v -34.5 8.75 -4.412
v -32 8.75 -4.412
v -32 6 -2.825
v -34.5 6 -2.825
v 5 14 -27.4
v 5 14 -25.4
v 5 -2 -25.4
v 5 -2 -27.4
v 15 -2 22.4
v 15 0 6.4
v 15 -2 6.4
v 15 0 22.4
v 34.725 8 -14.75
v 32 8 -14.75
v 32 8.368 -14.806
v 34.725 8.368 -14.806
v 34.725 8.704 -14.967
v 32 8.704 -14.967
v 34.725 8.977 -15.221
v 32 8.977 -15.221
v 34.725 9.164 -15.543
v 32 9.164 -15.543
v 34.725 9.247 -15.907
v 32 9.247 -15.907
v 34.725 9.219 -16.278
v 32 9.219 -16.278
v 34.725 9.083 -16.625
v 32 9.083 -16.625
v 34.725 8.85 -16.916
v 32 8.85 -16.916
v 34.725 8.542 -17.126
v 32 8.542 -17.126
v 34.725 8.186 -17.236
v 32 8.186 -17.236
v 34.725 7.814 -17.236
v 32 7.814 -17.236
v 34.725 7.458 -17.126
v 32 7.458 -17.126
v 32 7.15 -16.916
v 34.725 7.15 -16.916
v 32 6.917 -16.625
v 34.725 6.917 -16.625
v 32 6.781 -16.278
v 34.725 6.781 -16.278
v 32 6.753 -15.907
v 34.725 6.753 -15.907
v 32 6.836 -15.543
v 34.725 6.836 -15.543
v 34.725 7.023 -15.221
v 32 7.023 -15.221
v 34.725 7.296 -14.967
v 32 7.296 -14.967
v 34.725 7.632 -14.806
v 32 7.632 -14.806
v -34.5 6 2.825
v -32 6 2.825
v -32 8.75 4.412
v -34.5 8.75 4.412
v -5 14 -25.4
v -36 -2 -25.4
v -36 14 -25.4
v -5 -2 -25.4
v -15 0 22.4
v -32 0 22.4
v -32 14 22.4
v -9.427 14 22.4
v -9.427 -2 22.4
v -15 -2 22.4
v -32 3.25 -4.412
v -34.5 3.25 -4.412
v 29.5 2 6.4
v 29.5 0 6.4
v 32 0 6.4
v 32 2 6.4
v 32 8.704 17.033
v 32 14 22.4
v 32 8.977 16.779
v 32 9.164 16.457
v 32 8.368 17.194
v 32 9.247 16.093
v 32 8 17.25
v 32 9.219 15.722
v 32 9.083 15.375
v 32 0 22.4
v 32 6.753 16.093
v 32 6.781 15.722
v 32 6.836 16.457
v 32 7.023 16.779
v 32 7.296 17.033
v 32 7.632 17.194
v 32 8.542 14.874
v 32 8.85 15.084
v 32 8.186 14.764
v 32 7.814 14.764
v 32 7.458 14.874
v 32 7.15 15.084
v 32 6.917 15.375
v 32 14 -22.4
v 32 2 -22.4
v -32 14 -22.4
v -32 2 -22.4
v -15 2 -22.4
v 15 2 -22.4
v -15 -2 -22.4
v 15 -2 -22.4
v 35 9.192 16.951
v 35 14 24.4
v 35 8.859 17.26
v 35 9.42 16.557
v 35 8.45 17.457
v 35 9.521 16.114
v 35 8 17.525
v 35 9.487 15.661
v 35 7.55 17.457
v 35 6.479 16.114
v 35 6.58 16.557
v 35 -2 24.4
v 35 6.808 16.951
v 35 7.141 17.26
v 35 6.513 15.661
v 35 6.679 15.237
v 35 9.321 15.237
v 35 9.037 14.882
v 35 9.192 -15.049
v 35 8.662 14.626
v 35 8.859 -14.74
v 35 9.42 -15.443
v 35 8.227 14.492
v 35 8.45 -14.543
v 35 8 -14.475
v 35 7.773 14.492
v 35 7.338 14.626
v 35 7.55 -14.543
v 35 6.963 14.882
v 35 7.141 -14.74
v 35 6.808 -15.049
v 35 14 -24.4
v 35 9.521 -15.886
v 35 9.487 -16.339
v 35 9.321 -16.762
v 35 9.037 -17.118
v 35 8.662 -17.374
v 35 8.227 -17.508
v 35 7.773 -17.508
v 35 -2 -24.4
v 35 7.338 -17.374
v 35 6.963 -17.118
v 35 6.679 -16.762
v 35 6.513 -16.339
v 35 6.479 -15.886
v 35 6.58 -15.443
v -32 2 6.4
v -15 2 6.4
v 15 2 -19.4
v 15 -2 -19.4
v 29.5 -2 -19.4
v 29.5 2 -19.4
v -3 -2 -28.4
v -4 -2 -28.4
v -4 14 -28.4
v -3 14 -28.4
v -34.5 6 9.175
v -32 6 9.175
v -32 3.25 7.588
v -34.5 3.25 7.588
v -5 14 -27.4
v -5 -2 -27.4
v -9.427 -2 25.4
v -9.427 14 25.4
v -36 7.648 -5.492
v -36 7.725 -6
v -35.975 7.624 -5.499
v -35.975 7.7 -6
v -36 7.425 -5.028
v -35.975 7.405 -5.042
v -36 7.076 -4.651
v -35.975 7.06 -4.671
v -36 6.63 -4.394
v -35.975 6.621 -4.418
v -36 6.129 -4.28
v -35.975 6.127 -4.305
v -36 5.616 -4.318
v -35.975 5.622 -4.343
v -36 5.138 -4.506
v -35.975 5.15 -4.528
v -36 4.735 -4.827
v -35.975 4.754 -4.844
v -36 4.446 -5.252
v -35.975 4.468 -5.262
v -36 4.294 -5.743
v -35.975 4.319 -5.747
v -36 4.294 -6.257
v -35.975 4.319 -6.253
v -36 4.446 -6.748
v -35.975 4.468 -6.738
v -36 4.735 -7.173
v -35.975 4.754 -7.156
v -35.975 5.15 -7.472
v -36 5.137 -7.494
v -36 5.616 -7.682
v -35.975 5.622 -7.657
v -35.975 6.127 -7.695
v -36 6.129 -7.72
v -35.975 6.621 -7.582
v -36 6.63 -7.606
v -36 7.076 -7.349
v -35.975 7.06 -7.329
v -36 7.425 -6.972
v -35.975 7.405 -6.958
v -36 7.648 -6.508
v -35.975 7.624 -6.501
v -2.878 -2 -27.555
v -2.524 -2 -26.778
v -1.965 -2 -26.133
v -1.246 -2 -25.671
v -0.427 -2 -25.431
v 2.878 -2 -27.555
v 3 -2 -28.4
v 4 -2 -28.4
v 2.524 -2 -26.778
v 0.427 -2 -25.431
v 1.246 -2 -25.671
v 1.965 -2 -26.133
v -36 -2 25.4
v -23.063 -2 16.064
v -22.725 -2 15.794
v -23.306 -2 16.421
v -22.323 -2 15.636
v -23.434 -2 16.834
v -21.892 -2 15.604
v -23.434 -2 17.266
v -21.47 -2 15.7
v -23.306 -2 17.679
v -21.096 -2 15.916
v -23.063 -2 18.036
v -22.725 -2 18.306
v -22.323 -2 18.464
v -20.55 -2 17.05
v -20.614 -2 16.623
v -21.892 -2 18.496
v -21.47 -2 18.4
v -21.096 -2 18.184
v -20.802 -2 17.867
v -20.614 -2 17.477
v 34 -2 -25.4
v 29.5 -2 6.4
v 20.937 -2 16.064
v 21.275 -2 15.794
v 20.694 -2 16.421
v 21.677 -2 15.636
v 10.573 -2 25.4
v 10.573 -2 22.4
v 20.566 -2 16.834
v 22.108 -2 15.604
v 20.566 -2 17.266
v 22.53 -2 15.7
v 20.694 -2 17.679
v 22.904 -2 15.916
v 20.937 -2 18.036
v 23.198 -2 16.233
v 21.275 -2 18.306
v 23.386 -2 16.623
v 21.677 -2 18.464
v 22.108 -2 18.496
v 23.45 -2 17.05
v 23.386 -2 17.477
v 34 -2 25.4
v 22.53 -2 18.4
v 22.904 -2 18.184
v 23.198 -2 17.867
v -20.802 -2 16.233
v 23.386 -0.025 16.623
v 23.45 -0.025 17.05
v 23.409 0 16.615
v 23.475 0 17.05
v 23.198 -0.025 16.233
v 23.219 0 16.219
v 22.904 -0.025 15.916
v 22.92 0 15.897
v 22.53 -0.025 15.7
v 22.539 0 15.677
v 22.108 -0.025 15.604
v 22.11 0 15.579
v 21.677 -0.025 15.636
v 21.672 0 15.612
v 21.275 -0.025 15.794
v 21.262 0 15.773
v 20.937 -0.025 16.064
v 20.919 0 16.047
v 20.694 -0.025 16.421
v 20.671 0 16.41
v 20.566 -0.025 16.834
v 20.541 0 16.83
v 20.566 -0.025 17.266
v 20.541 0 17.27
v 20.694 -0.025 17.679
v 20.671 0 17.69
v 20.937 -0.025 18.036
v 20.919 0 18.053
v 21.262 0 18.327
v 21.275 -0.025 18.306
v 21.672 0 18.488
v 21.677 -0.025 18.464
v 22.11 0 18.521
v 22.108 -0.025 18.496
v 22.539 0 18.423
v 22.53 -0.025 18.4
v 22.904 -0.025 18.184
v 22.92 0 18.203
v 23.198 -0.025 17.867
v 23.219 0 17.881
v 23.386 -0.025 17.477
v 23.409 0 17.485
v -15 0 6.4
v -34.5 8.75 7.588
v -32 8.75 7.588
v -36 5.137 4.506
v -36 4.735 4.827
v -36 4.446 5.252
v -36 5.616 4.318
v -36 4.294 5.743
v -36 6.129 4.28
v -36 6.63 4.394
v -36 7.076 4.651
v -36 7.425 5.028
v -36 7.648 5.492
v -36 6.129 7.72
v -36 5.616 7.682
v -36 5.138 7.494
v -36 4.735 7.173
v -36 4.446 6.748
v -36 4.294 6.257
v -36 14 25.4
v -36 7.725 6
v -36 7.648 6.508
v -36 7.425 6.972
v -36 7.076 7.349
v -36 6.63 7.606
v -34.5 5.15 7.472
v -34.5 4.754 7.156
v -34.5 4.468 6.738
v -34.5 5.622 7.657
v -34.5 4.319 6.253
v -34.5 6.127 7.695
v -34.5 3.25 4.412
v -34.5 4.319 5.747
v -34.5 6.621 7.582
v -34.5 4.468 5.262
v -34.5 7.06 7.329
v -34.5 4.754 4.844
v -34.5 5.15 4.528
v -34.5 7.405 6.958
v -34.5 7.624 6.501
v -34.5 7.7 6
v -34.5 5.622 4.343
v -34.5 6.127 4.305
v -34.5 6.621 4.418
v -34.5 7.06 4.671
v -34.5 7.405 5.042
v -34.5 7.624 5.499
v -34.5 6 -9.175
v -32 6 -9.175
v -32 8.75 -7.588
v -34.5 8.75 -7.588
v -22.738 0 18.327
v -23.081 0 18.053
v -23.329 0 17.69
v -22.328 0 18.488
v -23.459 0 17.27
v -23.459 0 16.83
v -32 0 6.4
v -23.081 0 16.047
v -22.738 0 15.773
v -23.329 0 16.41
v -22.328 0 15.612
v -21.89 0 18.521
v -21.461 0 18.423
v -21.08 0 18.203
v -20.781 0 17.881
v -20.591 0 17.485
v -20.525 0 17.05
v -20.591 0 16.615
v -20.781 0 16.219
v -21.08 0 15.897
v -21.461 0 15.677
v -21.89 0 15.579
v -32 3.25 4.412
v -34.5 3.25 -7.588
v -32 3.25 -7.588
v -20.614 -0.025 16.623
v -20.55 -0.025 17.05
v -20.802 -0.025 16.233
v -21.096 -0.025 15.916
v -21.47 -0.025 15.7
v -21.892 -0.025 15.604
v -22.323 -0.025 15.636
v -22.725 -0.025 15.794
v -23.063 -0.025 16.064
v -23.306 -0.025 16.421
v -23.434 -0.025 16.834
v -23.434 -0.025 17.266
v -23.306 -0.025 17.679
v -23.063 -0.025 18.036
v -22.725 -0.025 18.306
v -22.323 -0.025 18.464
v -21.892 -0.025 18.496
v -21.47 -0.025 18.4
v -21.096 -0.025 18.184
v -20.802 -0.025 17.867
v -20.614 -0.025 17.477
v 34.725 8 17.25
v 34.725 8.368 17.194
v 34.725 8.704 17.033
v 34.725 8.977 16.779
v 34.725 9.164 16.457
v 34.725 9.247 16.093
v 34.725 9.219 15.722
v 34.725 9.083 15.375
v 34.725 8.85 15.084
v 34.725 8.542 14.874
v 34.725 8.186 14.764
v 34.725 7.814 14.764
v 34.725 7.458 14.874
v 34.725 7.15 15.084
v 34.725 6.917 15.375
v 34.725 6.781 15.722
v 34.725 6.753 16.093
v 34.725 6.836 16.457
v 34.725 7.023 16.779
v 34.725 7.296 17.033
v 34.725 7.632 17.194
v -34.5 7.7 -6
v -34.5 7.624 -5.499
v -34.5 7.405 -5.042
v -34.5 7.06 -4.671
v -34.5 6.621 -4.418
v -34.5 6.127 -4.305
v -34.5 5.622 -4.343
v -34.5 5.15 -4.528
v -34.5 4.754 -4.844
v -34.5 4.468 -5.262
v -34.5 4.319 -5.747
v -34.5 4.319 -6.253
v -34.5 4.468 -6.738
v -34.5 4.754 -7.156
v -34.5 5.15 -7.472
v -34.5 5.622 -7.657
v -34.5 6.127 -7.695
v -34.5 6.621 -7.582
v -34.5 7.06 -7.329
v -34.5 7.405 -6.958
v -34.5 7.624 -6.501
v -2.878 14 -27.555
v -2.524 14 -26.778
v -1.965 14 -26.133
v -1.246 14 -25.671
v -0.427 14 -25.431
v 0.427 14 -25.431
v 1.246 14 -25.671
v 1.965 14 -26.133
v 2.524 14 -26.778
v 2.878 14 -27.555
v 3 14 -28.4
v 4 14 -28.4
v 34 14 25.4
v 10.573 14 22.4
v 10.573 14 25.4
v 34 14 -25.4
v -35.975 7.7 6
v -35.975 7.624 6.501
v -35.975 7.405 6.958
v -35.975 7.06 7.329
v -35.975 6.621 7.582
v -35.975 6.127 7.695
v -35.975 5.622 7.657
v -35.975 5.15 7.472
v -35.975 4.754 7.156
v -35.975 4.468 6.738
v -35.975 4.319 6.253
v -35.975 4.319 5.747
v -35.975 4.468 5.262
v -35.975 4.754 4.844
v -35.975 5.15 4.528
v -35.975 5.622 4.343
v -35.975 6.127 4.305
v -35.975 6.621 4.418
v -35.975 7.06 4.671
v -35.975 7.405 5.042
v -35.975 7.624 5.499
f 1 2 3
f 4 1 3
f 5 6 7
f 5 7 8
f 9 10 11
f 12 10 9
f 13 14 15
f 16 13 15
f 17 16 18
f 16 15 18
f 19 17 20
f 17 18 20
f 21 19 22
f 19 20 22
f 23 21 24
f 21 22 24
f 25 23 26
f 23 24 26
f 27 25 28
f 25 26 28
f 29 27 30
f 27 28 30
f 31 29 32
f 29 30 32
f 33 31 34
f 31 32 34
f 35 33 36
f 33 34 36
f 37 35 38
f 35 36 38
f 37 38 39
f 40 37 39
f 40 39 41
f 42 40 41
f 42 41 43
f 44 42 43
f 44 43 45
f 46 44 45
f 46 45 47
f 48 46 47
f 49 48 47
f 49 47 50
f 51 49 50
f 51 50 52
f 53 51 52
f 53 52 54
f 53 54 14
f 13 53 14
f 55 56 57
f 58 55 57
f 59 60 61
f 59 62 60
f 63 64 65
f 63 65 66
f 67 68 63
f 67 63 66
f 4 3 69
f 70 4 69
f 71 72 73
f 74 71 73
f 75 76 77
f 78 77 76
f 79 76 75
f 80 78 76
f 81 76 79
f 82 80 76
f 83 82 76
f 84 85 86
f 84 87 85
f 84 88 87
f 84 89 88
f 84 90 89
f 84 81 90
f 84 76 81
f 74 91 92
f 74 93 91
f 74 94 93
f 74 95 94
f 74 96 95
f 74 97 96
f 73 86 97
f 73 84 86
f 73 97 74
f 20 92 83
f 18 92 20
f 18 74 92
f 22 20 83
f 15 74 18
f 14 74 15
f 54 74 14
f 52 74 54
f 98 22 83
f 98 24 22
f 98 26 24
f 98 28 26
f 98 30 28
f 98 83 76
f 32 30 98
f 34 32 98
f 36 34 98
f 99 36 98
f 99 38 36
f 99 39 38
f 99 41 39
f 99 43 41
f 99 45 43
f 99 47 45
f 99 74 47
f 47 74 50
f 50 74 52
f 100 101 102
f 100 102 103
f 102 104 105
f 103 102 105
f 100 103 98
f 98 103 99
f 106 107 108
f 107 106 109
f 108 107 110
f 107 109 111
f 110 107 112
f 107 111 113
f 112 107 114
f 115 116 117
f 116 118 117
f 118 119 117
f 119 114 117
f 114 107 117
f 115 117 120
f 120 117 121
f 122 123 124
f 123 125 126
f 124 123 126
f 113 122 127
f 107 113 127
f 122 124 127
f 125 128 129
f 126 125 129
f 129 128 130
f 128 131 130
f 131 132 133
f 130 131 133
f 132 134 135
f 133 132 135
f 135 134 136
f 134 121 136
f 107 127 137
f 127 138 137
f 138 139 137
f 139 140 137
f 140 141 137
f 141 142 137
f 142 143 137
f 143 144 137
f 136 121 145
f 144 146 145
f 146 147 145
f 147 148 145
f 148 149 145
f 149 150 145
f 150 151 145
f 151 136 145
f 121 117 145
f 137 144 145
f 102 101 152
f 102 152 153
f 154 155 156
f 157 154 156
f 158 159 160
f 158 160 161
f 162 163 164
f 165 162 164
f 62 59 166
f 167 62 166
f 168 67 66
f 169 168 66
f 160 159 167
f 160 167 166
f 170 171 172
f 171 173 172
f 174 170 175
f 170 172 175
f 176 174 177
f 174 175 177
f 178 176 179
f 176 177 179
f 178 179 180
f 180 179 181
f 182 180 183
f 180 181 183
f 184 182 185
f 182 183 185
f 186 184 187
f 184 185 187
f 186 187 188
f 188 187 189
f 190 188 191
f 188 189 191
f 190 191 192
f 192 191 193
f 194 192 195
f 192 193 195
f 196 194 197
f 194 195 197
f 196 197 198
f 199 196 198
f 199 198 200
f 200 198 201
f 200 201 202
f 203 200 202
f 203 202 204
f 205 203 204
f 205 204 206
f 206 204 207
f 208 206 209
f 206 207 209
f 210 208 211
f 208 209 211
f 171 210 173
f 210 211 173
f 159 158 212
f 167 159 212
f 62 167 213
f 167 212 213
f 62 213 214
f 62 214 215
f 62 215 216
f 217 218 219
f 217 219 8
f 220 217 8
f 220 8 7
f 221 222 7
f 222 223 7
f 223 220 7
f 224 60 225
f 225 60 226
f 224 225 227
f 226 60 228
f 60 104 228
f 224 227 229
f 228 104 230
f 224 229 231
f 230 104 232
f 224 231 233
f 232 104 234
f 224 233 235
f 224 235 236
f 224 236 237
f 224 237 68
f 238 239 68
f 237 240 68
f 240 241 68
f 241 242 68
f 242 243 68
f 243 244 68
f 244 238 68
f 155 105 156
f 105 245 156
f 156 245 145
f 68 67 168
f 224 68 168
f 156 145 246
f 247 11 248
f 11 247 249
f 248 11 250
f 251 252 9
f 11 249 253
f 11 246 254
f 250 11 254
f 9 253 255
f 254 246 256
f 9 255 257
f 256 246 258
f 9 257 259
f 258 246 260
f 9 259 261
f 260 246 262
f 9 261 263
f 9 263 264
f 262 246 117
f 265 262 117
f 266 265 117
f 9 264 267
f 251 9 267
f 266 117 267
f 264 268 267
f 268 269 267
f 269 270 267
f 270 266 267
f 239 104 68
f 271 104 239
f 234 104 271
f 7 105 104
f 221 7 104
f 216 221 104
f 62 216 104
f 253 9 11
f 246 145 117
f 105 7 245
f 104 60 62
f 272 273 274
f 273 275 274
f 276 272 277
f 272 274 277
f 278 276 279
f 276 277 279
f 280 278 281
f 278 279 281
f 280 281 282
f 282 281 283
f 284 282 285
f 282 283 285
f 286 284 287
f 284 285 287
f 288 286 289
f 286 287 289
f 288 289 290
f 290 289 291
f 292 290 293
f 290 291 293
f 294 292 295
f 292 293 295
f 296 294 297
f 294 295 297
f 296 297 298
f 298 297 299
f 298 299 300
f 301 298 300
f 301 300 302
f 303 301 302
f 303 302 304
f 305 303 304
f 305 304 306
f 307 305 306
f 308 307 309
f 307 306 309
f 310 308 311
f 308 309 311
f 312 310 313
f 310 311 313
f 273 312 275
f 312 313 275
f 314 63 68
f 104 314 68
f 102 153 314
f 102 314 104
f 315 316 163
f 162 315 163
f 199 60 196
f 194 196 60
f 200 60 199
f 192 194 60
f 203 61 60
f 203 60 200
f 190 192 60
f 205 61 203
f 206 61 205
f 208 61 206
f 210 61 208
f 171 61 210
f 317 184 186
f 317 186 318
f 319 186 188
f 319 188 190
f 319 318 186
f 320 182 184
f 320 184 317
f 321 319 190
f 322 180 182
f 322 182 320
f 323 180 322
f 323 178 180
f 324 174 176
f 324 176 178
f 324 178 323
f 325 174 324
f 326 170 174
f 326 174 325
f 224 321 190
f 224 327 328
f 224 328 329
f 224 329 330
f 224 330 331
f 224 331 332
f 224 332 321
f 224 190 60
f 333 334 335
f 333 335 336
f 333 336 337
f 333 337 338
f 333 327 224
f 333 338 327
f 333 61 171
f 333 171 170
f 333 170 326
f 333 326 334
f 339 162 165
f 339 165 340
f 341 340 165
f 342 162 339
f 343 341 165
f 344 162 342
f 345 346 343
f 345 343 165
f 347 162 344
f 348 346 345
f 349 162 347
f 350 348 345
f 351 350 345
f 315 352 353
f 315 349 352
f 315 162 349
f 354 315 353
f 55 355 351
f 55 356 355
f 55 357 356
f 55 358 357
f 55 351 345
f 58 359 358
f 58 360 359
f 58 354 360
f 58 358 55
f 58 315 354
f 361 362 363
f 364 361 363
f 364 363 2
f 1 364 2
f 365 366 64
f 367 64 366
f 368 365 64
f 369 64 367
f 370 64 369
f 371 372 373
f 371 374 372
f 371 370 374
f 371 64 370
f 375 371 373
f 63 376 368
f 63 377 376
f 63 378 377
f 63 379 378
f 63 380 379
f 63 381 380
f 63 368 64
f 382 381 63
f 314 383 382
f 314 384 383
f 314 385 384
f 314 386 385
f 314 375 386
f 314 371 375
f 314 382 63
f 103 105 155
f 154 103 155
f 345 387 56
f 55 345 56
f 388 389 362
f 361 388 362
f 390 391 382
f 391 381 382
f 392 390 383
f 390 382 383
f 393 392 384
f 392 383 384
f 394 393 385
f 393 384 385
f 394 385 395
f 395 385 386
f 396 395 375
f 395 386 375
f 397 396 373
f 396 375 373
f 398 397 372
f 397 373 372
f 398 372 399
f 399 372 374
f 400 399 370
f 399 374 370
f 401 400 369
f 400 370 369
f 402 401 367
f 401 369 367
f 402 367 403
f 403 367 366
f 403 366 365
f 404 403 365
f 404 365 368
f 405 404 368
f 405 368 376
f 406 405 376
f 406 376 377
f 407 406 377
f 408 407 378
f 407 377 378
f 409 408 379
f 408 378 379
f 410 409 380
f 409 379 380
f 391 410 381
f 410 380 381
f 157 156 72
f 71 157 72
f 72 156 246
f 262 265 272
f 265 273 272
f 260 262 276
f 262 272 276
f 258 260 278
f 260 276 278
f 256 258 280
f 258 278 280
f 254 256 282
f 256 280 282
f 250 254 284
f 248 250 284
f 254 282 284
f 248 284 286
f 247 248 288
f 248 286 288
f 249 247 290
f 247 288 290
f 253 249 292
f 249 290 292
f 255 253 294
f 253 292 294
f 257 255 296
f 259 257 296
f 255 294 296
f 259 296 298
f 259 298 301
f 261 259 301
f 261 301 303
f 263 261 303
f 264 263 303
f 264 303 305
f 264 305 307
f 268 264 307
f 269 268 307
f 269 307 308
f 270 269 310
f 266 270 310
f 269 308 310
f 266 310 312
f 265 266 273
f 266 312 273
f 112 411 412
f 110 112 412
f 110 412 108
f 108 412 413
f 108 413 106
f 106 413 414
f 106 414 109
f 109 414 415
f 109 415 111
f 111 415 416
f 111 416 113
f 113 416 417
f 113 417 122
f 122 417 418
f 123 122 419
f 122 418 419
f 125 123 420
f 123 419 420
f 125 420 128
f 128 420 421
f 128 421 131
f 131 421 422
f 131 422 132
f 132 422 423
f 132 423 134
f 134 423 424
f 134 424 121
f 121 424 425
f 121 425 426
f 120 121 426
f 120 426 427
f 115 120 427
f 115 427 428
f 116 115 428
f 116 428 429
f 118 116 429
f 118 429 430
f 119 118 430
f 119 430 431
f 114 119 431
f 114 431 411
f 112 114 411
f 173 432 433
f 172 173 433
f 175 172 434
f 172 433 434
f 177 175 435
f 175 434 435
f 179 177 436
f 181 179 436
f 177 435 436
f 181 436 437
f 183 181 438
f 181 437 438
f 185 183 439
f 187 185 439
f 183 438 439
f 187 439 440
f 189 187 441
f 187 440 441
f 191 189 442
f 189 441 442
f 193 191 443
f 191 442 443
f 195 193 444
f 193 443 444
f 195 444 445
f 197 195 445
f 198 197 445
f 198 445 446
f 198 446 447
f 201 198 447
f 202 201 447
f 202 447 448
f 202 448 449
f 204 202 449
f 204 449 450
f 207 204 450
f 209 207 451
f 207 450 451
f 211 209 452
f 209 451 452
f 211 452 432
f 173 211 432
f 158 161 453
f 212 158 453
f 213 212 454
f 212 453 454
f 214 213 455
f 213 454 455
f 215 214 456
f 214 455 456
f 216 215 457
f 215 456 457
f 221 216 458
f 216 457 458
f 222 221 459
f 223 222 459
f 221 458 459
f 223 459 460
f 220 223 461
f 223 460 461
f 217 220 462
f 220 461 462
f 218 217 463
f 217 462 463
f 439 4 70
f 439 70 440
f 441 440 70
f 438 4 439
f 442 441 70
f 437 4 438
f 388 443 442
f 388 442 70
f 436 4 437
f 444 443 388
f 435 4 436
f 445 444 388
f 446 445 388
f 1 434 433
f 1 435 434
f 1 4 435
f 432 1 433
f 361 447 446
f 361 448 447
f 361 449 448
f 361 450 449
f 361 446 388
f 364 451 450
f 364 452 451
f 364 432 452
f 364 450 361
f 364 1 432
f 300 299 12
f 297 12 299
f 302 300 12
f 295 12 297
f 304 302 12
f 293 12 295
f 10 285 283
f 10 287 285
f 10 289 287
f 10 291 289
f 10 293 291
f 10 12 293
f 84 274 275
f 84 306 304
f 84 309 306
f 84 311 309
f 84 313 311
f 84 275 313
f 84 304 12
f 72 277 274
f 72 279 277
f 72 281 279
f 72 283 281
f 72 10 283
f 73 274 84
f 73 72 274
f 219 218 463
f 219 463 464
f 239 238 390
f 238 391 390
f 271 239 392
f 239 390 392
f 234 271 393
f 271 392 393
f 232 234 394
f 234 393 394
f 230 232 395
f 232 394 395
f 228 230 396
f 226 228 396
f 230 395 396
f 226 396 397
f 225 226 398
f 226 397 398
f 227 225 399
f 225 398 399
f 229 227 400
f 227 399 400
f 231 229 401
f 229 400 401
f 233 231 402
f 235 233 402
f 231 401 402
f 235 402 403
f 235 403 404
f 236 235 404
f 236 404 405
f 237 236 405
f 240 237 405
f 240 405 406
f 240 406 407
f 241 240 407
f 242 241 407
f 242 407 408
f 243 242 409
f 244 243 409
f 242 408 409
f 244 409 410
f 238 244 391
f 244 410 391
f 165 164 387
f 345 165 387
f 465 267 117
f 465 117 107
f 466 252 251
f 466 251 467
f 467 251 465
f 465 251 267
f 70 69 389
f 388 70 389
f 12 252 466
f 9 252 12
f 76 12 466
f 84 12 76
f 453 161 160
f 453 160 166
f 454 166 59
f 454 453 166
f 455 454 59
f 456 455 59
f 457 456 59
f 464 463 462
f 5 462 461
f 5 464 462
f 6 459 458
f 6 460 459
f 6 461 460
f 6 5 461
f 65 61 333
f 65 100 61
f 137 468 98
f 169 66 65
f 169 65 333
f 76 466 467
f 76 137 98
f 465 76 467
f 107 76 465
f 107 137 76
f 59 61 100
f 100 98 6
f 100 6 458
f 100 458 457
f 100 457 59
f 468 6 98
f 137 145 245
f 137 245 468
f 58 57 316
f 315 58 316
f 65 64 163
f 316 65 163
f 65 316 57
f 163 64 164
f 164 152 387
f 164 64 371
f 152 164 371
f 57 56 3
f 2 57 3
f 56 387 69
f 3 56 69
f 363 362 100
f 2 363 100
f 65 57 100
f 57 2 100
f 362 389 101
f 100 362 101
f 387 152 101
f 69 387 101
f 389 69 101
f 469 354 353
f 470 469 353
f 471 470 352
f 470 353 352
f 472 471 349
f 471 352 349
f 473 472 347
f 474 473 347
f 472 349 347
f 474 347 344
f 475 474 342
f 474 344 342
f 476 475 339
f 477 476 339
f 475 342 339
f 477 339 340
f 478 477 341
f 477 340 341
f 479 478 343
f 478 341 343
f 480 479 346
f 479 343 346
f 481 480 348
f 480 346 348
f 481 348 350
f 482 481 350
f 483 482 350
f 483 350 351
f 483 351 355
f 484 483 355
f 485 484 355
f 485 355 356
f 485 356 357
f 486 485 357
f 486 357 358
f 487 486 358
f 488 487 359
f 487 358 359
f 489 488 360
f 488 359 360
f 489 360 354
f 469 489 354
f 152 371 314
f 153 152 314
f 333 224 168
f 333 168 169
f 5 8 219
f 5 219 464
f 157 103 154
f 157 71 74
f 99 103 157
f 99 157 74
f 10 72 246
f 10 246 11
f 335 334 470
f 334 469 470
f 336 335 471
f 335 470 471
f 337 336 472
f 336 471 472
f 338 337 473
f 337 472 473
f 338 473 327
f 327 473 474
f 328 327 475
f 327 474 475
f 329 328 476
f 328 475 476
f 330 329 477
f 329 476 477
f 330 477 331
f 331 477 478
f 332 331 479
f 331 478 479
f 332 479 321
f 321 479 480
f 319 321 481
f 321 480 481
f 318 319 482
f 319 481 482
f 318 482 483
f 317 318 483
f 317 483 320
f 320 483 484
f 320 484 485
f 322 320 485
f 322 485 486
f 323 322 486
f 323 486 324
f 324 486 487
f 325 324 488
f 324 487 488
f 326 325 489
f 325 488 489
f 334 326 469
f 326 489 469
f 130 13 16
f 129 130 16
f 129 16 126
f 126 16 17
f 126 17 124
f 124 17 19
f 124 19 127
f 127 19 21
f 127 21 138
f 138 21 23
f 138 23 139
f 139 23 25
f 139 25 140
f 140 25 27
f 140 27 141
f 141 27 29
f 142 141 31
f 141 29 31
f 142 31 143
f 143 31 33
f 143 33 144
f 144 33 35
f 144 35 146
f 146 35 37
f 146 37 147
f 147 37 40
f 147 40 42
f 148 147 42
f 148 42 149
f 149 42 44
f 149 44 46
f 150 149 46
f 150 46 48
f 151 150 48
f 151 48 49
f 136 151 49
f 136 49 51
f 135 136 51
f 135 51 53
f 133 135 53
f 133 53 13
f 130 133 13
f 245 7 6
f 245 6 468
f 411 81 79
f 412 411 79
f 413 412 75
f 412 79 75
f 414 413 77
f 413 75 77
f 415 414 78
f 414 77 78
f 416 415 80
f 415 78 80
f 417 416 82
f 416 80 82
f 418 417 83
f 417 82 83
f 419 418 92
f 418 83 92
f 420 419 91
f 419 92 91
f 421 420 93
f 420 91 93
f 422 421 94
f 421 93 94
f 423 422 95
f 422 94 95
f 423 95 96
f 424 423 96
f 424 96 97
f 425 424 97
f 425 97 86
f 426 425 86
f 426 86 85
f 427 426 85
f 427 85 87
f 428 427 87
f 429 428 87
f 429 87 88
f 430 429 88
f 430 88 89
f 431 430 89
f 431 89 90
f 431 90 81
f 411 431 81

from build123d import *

# Parameters (mm, degrees)
EXTRUDE_1_DEPTH              = 14
EXTRUDE_1_DEPTH_BACK         = 2
SKETCH_1_W                   = 70
SKETCH_1_H                   = 50.8
SKETCH_1_W_2                 = 64
SKETCH_1_H_2                 = 44.8
EXTRUDE_1_2_DEPTH            = 2
EXTRUDE_1_2_DEPTH_BACK       = 2
SKETCH_1_3_W                 = 17
SKETCH_1_3_H                 = 28.8
SKETCH_1_4_W                 = 17
SKETCH_1_4_H                 = 16
EXTRUDE_2_DEPTH              = 2
CUT_EXTRUDE_1_REACH          = 62.876
SKETCH_3_W                   = 20
SKETCH_3_H                   = 16
EXTRUDE_START                = -2
EXTRUDE_5_OUTLINE_W          = 10
EXTRUDE_5_OUTLINE_H          = 3
EXTRUDE_5_DEPTH              = 16
CUT_EXTRUDE_2_REACH          = 49.828
SKETCH_11_R                  = 3
CHAMFER_1_SIZE               = 1
HOLE_WIZARD_M3_1_D           = 2.5
HOLE_WIZARD_M3_1_DEPTH       = 3
HOLE_WIZARD_M3_1_CSINK_D     = 3.05
HOLE_WIZARD_M3_1_CSINK_ANGLE = 90
SKETCH_16_W                  = 50.8
SKETCH_16_H                  = 16
EXTRUDE_6_DEPTH              = 1
CUT_EXTRUDE_3_DEPTH          = 2.5


# Read off the part's stored shape, not the designer's step: M2.5 间隙孔1, 凸台-拉伸5, M3 间隙孔1
with BuildPart() as part:
    # 草图1 → Extrude 1 (new, two sides: drawn at the far end of the back side and taken through both)
    with BuildSketch(Plane(origin=(0, 0, 0), x_dir=(1, 0, 0), z_dir=(0, 1, 0)).offset(-EXTRUDE_1_DEPTH_BACK)):
        Rectangle(SKETCH_1_W, SKETCH_1_H)
        Rectangle(SKETCH_1_W_2, SKETCH_1_H_2, mode=Mode.SUBTRACT)
    extrude(amount=EXTRUDE_1_DEPTH + EXTRUDE_1_DEPTH_BACK)

    # 草图1<3> → Extrude 1 2 (add, two sides: drawn at the far end of the back side and taken through both)
    with BuildSketch(Plane(origin=(0, 0, 0), x_dir=(1, 0, 0), z_dir=(0, 1, 0)).offset(-EXTRUDE_1_2_DEPTH_BACK)):
        Polygon((32, 22.4), (15, 22.4), (15, 19.4), (29.5, 19.4), (29.5, -6.4), (32, -6.4), align=None)
        with Locations((-23.5, 8)):
            Rectangle(SKETCH_1_3_W, SKETCH_1_3_H)
    extrude(amount=EXTRUDE_1_2_DEPTH + EXTRUDE_1_2_DEPTH_BACK)

    # 草图1<4> → 凸台-拉伸2 (add)
    with BuildSketch(Plane(origin=(0, 0, 0), x_dir=(1, 0, 0), z_dir=(0, 1, 0))):
        Polygon((15, -6.4), (15, -22.4), (32, -22.4), (32, -6.4), (29.5, -6.4), align=None)
        with Locations((-23.5, -14.4)):
            Rectangle(SKETCH_1_4_W, SKETCH_1_4_H)
    extrude(amount=-EXTRUDE_2_DEPTH)

    # 草图3 → 切除-拉伸1 (cut, up to next)
    with BuildSketch(Plane(origin=(0, 0, 22.4), x_dir=(-1, 0, 0), z_dir=(0, 0, -1)), mode=Mode.PRIVATE) as cut_extrude_1_sk1:
        with Locations((-0.572922779, 6)):
            Rectangle(SKETCH_3_W, SKETCH_3_H)
    cut_extrude_1_tool1 = extrude(cut_extrude_1_sk1.sketch, amount=-CUT_EXTRUDE_1_REACH, mode=Mode.PRIVATE) & part.part
    add(cut_extrude_1_tool1.solids().sort_by_distance((0.572923, 6, 22.4))[0], mode=Mode.SUBTRACT)

    # M2.5 间隙孔1 outline → M2.5 间隙孔1 (revolve, cut)
    with BuildSketch(Plane(origin=(22, 0, 17.05), x_dir=(1, 0, 0), z_dir=(0, 0, 1))):
        Polygon((0, -2), (1.45, -2), (1.45, -0.025), (1.475, 0), (0, 0), align=None)
    revolve(axis=Axis((22, 0, 17.05), (0, 1, 0)), mode=Mode.SUBTRACT)

    # Hole Wizard M2.5 _1 2 outline → Hole Wizard M2.5 _1 2 (revolve, cut)
    with BuildSketch(Plane(origin=(-22, 0, 17.05), x_dir=(1, 0, 0), z_dir=(0, 0, 1))):
        Polygon((0, -2), (1.45, -2), (1.45, -0.025), (1.475, 0), (0, 0), align=None)
    revolve(axis=Axis((-22, 0, 17.05), (0, 1, 0)), mode=Mode.SUBTRACT)

    # 凸台-拉伸5 outline → 凸台-拉伸5 (add)
    with BuildSketch(Plane(origin=(0, 0, 0), x_dir=(1, 0, 0), z_dir=(0, 1, 0)).offset(EXTRUDE_START)):
        with Locations((0, 26.9)):
            Rectangle(EXTRUDE_5_OUTLINE_W, EXTRUDE_5_OUTLINE_H)
    extrude(amount=EXTRUDE_5_DEPTH)

    # 草图11 → 切除-拉伸2 (cut, up to next)
    with BuildSketch(Plane(origin=(0, 14, 0), x_dir=(1, 0, 0), z_dir=(0, 1, 0)), mode=Mode.PRIVATE) as cut_extrude_2_sk1:
        with Locations((0, 28.4)):
            Circle(SKETCH_11_R)
    cut_extrude_2_tool1 = extrude(cut_extrude_2_sk1.sketch, amount=-CUT_EXTRUDE_2_REACH, mode=Mode.PRIVATE) & part.part
    add(cut_extrude_2_tool1.solids().sort_by_distance((0, 14, -28.4))[0], mode=Mode.SUBTRACT)

    # 倒角1
    chamfer_1_edges = [part.edges().sort_by_distance(p)[0] for p in [
        (5, 6, -28.4),
        (-5, 6, -28.4),
        (35, 6, -25.4),
        (35, 6, 25.4),
    ]]
    chamfer(chamfer_1_edges, length=CHAMFER_1_SIZE)

    # Hole Wizard M3 _1
    with Locations(Plane(origin=(35, 0, 0), x_dir=(0, 0, -1), z_dir=(1, 0, 0))):
        with Locations((-16, 8), (16, 8)):
            CounterSinkHole(HOLE_WIZARD_M3_1_D / 2, HOLE_WIZARD_M3_1_CSINK_D / 2, depth=HOLE_WIZARD_M3_1_DEPTH, counter_sink_angle=HOLE_WIZARD_M3_1_CSINK_ANGLE)

    # 草图16 → 凸台-拉伸6 (add)
    with BuildSketch(Plane.ZY.offset(35)):
        with Locations((0, 6)):
            Rectangle(SKETCH_16_W, SKETCH_16_H)
    extrude(amount=EXTRUDE_6_DEPTH)

    # Hole Wizard M3 _1 2 outline → Hole Wizard M3 _1 2 (revolve, cut)
    with BuildSketch(Plane(origin=(0, 6, 6), x_dir=(0, 1, 0), z_dir=(0, 0, -1))):
        Polygon((1.7, -35.975), (1.7, -32), (0, -32), (0, -36), (1.725, -36), align=None)
    revolve(axis=Axis((0, 6, 6), (1, 0, 0)), mode=Mode.SUBTRACT)

    # Hole Wizard M3 _1 2 2 outline → Hole Wizard M3 _1 2 2 (revolve, cut)
    with BuildSketch(Plane(origin=(0, 6, -6), x_dir=(0, 1, 0), z_dir=(0, 0, -1))):
        Polygon((1.7, -35.975), (1.7, -32), (0, -32), (0, -36), (1.725, -36), align=None)
    revolve(axis=Axis((0, 6, -6), (1, 0, 0)), mode=Mode.SUBTRACT)

    # 草图23 → 切除-拉伸3 (cut)
    with BuildSketch(Plane(origin=(-32, 0, 0), x_dir=(0, 0, -1), z_dir=(1, 0, 0))):
        Polygon((-9.175426481, 6), (-7.58771324, 3.25), (-4.41228676, 3.25), (-2.824573519, 6), (-4.41228676, 8.75), (-7.58771324, 8.75), align=None)
        Polygon((2.824573519, 6), (4.41228676, 3.25), (7.58771324, 3.25), (9.175426481, 6), (7.58771324, 8.75), (4.41228676, 8.75), align=None)
    extrude(amount=-CUT_EXTRUDE_3_DEPTH, mode=Mode.SUBTRACT)


solid = part.part
